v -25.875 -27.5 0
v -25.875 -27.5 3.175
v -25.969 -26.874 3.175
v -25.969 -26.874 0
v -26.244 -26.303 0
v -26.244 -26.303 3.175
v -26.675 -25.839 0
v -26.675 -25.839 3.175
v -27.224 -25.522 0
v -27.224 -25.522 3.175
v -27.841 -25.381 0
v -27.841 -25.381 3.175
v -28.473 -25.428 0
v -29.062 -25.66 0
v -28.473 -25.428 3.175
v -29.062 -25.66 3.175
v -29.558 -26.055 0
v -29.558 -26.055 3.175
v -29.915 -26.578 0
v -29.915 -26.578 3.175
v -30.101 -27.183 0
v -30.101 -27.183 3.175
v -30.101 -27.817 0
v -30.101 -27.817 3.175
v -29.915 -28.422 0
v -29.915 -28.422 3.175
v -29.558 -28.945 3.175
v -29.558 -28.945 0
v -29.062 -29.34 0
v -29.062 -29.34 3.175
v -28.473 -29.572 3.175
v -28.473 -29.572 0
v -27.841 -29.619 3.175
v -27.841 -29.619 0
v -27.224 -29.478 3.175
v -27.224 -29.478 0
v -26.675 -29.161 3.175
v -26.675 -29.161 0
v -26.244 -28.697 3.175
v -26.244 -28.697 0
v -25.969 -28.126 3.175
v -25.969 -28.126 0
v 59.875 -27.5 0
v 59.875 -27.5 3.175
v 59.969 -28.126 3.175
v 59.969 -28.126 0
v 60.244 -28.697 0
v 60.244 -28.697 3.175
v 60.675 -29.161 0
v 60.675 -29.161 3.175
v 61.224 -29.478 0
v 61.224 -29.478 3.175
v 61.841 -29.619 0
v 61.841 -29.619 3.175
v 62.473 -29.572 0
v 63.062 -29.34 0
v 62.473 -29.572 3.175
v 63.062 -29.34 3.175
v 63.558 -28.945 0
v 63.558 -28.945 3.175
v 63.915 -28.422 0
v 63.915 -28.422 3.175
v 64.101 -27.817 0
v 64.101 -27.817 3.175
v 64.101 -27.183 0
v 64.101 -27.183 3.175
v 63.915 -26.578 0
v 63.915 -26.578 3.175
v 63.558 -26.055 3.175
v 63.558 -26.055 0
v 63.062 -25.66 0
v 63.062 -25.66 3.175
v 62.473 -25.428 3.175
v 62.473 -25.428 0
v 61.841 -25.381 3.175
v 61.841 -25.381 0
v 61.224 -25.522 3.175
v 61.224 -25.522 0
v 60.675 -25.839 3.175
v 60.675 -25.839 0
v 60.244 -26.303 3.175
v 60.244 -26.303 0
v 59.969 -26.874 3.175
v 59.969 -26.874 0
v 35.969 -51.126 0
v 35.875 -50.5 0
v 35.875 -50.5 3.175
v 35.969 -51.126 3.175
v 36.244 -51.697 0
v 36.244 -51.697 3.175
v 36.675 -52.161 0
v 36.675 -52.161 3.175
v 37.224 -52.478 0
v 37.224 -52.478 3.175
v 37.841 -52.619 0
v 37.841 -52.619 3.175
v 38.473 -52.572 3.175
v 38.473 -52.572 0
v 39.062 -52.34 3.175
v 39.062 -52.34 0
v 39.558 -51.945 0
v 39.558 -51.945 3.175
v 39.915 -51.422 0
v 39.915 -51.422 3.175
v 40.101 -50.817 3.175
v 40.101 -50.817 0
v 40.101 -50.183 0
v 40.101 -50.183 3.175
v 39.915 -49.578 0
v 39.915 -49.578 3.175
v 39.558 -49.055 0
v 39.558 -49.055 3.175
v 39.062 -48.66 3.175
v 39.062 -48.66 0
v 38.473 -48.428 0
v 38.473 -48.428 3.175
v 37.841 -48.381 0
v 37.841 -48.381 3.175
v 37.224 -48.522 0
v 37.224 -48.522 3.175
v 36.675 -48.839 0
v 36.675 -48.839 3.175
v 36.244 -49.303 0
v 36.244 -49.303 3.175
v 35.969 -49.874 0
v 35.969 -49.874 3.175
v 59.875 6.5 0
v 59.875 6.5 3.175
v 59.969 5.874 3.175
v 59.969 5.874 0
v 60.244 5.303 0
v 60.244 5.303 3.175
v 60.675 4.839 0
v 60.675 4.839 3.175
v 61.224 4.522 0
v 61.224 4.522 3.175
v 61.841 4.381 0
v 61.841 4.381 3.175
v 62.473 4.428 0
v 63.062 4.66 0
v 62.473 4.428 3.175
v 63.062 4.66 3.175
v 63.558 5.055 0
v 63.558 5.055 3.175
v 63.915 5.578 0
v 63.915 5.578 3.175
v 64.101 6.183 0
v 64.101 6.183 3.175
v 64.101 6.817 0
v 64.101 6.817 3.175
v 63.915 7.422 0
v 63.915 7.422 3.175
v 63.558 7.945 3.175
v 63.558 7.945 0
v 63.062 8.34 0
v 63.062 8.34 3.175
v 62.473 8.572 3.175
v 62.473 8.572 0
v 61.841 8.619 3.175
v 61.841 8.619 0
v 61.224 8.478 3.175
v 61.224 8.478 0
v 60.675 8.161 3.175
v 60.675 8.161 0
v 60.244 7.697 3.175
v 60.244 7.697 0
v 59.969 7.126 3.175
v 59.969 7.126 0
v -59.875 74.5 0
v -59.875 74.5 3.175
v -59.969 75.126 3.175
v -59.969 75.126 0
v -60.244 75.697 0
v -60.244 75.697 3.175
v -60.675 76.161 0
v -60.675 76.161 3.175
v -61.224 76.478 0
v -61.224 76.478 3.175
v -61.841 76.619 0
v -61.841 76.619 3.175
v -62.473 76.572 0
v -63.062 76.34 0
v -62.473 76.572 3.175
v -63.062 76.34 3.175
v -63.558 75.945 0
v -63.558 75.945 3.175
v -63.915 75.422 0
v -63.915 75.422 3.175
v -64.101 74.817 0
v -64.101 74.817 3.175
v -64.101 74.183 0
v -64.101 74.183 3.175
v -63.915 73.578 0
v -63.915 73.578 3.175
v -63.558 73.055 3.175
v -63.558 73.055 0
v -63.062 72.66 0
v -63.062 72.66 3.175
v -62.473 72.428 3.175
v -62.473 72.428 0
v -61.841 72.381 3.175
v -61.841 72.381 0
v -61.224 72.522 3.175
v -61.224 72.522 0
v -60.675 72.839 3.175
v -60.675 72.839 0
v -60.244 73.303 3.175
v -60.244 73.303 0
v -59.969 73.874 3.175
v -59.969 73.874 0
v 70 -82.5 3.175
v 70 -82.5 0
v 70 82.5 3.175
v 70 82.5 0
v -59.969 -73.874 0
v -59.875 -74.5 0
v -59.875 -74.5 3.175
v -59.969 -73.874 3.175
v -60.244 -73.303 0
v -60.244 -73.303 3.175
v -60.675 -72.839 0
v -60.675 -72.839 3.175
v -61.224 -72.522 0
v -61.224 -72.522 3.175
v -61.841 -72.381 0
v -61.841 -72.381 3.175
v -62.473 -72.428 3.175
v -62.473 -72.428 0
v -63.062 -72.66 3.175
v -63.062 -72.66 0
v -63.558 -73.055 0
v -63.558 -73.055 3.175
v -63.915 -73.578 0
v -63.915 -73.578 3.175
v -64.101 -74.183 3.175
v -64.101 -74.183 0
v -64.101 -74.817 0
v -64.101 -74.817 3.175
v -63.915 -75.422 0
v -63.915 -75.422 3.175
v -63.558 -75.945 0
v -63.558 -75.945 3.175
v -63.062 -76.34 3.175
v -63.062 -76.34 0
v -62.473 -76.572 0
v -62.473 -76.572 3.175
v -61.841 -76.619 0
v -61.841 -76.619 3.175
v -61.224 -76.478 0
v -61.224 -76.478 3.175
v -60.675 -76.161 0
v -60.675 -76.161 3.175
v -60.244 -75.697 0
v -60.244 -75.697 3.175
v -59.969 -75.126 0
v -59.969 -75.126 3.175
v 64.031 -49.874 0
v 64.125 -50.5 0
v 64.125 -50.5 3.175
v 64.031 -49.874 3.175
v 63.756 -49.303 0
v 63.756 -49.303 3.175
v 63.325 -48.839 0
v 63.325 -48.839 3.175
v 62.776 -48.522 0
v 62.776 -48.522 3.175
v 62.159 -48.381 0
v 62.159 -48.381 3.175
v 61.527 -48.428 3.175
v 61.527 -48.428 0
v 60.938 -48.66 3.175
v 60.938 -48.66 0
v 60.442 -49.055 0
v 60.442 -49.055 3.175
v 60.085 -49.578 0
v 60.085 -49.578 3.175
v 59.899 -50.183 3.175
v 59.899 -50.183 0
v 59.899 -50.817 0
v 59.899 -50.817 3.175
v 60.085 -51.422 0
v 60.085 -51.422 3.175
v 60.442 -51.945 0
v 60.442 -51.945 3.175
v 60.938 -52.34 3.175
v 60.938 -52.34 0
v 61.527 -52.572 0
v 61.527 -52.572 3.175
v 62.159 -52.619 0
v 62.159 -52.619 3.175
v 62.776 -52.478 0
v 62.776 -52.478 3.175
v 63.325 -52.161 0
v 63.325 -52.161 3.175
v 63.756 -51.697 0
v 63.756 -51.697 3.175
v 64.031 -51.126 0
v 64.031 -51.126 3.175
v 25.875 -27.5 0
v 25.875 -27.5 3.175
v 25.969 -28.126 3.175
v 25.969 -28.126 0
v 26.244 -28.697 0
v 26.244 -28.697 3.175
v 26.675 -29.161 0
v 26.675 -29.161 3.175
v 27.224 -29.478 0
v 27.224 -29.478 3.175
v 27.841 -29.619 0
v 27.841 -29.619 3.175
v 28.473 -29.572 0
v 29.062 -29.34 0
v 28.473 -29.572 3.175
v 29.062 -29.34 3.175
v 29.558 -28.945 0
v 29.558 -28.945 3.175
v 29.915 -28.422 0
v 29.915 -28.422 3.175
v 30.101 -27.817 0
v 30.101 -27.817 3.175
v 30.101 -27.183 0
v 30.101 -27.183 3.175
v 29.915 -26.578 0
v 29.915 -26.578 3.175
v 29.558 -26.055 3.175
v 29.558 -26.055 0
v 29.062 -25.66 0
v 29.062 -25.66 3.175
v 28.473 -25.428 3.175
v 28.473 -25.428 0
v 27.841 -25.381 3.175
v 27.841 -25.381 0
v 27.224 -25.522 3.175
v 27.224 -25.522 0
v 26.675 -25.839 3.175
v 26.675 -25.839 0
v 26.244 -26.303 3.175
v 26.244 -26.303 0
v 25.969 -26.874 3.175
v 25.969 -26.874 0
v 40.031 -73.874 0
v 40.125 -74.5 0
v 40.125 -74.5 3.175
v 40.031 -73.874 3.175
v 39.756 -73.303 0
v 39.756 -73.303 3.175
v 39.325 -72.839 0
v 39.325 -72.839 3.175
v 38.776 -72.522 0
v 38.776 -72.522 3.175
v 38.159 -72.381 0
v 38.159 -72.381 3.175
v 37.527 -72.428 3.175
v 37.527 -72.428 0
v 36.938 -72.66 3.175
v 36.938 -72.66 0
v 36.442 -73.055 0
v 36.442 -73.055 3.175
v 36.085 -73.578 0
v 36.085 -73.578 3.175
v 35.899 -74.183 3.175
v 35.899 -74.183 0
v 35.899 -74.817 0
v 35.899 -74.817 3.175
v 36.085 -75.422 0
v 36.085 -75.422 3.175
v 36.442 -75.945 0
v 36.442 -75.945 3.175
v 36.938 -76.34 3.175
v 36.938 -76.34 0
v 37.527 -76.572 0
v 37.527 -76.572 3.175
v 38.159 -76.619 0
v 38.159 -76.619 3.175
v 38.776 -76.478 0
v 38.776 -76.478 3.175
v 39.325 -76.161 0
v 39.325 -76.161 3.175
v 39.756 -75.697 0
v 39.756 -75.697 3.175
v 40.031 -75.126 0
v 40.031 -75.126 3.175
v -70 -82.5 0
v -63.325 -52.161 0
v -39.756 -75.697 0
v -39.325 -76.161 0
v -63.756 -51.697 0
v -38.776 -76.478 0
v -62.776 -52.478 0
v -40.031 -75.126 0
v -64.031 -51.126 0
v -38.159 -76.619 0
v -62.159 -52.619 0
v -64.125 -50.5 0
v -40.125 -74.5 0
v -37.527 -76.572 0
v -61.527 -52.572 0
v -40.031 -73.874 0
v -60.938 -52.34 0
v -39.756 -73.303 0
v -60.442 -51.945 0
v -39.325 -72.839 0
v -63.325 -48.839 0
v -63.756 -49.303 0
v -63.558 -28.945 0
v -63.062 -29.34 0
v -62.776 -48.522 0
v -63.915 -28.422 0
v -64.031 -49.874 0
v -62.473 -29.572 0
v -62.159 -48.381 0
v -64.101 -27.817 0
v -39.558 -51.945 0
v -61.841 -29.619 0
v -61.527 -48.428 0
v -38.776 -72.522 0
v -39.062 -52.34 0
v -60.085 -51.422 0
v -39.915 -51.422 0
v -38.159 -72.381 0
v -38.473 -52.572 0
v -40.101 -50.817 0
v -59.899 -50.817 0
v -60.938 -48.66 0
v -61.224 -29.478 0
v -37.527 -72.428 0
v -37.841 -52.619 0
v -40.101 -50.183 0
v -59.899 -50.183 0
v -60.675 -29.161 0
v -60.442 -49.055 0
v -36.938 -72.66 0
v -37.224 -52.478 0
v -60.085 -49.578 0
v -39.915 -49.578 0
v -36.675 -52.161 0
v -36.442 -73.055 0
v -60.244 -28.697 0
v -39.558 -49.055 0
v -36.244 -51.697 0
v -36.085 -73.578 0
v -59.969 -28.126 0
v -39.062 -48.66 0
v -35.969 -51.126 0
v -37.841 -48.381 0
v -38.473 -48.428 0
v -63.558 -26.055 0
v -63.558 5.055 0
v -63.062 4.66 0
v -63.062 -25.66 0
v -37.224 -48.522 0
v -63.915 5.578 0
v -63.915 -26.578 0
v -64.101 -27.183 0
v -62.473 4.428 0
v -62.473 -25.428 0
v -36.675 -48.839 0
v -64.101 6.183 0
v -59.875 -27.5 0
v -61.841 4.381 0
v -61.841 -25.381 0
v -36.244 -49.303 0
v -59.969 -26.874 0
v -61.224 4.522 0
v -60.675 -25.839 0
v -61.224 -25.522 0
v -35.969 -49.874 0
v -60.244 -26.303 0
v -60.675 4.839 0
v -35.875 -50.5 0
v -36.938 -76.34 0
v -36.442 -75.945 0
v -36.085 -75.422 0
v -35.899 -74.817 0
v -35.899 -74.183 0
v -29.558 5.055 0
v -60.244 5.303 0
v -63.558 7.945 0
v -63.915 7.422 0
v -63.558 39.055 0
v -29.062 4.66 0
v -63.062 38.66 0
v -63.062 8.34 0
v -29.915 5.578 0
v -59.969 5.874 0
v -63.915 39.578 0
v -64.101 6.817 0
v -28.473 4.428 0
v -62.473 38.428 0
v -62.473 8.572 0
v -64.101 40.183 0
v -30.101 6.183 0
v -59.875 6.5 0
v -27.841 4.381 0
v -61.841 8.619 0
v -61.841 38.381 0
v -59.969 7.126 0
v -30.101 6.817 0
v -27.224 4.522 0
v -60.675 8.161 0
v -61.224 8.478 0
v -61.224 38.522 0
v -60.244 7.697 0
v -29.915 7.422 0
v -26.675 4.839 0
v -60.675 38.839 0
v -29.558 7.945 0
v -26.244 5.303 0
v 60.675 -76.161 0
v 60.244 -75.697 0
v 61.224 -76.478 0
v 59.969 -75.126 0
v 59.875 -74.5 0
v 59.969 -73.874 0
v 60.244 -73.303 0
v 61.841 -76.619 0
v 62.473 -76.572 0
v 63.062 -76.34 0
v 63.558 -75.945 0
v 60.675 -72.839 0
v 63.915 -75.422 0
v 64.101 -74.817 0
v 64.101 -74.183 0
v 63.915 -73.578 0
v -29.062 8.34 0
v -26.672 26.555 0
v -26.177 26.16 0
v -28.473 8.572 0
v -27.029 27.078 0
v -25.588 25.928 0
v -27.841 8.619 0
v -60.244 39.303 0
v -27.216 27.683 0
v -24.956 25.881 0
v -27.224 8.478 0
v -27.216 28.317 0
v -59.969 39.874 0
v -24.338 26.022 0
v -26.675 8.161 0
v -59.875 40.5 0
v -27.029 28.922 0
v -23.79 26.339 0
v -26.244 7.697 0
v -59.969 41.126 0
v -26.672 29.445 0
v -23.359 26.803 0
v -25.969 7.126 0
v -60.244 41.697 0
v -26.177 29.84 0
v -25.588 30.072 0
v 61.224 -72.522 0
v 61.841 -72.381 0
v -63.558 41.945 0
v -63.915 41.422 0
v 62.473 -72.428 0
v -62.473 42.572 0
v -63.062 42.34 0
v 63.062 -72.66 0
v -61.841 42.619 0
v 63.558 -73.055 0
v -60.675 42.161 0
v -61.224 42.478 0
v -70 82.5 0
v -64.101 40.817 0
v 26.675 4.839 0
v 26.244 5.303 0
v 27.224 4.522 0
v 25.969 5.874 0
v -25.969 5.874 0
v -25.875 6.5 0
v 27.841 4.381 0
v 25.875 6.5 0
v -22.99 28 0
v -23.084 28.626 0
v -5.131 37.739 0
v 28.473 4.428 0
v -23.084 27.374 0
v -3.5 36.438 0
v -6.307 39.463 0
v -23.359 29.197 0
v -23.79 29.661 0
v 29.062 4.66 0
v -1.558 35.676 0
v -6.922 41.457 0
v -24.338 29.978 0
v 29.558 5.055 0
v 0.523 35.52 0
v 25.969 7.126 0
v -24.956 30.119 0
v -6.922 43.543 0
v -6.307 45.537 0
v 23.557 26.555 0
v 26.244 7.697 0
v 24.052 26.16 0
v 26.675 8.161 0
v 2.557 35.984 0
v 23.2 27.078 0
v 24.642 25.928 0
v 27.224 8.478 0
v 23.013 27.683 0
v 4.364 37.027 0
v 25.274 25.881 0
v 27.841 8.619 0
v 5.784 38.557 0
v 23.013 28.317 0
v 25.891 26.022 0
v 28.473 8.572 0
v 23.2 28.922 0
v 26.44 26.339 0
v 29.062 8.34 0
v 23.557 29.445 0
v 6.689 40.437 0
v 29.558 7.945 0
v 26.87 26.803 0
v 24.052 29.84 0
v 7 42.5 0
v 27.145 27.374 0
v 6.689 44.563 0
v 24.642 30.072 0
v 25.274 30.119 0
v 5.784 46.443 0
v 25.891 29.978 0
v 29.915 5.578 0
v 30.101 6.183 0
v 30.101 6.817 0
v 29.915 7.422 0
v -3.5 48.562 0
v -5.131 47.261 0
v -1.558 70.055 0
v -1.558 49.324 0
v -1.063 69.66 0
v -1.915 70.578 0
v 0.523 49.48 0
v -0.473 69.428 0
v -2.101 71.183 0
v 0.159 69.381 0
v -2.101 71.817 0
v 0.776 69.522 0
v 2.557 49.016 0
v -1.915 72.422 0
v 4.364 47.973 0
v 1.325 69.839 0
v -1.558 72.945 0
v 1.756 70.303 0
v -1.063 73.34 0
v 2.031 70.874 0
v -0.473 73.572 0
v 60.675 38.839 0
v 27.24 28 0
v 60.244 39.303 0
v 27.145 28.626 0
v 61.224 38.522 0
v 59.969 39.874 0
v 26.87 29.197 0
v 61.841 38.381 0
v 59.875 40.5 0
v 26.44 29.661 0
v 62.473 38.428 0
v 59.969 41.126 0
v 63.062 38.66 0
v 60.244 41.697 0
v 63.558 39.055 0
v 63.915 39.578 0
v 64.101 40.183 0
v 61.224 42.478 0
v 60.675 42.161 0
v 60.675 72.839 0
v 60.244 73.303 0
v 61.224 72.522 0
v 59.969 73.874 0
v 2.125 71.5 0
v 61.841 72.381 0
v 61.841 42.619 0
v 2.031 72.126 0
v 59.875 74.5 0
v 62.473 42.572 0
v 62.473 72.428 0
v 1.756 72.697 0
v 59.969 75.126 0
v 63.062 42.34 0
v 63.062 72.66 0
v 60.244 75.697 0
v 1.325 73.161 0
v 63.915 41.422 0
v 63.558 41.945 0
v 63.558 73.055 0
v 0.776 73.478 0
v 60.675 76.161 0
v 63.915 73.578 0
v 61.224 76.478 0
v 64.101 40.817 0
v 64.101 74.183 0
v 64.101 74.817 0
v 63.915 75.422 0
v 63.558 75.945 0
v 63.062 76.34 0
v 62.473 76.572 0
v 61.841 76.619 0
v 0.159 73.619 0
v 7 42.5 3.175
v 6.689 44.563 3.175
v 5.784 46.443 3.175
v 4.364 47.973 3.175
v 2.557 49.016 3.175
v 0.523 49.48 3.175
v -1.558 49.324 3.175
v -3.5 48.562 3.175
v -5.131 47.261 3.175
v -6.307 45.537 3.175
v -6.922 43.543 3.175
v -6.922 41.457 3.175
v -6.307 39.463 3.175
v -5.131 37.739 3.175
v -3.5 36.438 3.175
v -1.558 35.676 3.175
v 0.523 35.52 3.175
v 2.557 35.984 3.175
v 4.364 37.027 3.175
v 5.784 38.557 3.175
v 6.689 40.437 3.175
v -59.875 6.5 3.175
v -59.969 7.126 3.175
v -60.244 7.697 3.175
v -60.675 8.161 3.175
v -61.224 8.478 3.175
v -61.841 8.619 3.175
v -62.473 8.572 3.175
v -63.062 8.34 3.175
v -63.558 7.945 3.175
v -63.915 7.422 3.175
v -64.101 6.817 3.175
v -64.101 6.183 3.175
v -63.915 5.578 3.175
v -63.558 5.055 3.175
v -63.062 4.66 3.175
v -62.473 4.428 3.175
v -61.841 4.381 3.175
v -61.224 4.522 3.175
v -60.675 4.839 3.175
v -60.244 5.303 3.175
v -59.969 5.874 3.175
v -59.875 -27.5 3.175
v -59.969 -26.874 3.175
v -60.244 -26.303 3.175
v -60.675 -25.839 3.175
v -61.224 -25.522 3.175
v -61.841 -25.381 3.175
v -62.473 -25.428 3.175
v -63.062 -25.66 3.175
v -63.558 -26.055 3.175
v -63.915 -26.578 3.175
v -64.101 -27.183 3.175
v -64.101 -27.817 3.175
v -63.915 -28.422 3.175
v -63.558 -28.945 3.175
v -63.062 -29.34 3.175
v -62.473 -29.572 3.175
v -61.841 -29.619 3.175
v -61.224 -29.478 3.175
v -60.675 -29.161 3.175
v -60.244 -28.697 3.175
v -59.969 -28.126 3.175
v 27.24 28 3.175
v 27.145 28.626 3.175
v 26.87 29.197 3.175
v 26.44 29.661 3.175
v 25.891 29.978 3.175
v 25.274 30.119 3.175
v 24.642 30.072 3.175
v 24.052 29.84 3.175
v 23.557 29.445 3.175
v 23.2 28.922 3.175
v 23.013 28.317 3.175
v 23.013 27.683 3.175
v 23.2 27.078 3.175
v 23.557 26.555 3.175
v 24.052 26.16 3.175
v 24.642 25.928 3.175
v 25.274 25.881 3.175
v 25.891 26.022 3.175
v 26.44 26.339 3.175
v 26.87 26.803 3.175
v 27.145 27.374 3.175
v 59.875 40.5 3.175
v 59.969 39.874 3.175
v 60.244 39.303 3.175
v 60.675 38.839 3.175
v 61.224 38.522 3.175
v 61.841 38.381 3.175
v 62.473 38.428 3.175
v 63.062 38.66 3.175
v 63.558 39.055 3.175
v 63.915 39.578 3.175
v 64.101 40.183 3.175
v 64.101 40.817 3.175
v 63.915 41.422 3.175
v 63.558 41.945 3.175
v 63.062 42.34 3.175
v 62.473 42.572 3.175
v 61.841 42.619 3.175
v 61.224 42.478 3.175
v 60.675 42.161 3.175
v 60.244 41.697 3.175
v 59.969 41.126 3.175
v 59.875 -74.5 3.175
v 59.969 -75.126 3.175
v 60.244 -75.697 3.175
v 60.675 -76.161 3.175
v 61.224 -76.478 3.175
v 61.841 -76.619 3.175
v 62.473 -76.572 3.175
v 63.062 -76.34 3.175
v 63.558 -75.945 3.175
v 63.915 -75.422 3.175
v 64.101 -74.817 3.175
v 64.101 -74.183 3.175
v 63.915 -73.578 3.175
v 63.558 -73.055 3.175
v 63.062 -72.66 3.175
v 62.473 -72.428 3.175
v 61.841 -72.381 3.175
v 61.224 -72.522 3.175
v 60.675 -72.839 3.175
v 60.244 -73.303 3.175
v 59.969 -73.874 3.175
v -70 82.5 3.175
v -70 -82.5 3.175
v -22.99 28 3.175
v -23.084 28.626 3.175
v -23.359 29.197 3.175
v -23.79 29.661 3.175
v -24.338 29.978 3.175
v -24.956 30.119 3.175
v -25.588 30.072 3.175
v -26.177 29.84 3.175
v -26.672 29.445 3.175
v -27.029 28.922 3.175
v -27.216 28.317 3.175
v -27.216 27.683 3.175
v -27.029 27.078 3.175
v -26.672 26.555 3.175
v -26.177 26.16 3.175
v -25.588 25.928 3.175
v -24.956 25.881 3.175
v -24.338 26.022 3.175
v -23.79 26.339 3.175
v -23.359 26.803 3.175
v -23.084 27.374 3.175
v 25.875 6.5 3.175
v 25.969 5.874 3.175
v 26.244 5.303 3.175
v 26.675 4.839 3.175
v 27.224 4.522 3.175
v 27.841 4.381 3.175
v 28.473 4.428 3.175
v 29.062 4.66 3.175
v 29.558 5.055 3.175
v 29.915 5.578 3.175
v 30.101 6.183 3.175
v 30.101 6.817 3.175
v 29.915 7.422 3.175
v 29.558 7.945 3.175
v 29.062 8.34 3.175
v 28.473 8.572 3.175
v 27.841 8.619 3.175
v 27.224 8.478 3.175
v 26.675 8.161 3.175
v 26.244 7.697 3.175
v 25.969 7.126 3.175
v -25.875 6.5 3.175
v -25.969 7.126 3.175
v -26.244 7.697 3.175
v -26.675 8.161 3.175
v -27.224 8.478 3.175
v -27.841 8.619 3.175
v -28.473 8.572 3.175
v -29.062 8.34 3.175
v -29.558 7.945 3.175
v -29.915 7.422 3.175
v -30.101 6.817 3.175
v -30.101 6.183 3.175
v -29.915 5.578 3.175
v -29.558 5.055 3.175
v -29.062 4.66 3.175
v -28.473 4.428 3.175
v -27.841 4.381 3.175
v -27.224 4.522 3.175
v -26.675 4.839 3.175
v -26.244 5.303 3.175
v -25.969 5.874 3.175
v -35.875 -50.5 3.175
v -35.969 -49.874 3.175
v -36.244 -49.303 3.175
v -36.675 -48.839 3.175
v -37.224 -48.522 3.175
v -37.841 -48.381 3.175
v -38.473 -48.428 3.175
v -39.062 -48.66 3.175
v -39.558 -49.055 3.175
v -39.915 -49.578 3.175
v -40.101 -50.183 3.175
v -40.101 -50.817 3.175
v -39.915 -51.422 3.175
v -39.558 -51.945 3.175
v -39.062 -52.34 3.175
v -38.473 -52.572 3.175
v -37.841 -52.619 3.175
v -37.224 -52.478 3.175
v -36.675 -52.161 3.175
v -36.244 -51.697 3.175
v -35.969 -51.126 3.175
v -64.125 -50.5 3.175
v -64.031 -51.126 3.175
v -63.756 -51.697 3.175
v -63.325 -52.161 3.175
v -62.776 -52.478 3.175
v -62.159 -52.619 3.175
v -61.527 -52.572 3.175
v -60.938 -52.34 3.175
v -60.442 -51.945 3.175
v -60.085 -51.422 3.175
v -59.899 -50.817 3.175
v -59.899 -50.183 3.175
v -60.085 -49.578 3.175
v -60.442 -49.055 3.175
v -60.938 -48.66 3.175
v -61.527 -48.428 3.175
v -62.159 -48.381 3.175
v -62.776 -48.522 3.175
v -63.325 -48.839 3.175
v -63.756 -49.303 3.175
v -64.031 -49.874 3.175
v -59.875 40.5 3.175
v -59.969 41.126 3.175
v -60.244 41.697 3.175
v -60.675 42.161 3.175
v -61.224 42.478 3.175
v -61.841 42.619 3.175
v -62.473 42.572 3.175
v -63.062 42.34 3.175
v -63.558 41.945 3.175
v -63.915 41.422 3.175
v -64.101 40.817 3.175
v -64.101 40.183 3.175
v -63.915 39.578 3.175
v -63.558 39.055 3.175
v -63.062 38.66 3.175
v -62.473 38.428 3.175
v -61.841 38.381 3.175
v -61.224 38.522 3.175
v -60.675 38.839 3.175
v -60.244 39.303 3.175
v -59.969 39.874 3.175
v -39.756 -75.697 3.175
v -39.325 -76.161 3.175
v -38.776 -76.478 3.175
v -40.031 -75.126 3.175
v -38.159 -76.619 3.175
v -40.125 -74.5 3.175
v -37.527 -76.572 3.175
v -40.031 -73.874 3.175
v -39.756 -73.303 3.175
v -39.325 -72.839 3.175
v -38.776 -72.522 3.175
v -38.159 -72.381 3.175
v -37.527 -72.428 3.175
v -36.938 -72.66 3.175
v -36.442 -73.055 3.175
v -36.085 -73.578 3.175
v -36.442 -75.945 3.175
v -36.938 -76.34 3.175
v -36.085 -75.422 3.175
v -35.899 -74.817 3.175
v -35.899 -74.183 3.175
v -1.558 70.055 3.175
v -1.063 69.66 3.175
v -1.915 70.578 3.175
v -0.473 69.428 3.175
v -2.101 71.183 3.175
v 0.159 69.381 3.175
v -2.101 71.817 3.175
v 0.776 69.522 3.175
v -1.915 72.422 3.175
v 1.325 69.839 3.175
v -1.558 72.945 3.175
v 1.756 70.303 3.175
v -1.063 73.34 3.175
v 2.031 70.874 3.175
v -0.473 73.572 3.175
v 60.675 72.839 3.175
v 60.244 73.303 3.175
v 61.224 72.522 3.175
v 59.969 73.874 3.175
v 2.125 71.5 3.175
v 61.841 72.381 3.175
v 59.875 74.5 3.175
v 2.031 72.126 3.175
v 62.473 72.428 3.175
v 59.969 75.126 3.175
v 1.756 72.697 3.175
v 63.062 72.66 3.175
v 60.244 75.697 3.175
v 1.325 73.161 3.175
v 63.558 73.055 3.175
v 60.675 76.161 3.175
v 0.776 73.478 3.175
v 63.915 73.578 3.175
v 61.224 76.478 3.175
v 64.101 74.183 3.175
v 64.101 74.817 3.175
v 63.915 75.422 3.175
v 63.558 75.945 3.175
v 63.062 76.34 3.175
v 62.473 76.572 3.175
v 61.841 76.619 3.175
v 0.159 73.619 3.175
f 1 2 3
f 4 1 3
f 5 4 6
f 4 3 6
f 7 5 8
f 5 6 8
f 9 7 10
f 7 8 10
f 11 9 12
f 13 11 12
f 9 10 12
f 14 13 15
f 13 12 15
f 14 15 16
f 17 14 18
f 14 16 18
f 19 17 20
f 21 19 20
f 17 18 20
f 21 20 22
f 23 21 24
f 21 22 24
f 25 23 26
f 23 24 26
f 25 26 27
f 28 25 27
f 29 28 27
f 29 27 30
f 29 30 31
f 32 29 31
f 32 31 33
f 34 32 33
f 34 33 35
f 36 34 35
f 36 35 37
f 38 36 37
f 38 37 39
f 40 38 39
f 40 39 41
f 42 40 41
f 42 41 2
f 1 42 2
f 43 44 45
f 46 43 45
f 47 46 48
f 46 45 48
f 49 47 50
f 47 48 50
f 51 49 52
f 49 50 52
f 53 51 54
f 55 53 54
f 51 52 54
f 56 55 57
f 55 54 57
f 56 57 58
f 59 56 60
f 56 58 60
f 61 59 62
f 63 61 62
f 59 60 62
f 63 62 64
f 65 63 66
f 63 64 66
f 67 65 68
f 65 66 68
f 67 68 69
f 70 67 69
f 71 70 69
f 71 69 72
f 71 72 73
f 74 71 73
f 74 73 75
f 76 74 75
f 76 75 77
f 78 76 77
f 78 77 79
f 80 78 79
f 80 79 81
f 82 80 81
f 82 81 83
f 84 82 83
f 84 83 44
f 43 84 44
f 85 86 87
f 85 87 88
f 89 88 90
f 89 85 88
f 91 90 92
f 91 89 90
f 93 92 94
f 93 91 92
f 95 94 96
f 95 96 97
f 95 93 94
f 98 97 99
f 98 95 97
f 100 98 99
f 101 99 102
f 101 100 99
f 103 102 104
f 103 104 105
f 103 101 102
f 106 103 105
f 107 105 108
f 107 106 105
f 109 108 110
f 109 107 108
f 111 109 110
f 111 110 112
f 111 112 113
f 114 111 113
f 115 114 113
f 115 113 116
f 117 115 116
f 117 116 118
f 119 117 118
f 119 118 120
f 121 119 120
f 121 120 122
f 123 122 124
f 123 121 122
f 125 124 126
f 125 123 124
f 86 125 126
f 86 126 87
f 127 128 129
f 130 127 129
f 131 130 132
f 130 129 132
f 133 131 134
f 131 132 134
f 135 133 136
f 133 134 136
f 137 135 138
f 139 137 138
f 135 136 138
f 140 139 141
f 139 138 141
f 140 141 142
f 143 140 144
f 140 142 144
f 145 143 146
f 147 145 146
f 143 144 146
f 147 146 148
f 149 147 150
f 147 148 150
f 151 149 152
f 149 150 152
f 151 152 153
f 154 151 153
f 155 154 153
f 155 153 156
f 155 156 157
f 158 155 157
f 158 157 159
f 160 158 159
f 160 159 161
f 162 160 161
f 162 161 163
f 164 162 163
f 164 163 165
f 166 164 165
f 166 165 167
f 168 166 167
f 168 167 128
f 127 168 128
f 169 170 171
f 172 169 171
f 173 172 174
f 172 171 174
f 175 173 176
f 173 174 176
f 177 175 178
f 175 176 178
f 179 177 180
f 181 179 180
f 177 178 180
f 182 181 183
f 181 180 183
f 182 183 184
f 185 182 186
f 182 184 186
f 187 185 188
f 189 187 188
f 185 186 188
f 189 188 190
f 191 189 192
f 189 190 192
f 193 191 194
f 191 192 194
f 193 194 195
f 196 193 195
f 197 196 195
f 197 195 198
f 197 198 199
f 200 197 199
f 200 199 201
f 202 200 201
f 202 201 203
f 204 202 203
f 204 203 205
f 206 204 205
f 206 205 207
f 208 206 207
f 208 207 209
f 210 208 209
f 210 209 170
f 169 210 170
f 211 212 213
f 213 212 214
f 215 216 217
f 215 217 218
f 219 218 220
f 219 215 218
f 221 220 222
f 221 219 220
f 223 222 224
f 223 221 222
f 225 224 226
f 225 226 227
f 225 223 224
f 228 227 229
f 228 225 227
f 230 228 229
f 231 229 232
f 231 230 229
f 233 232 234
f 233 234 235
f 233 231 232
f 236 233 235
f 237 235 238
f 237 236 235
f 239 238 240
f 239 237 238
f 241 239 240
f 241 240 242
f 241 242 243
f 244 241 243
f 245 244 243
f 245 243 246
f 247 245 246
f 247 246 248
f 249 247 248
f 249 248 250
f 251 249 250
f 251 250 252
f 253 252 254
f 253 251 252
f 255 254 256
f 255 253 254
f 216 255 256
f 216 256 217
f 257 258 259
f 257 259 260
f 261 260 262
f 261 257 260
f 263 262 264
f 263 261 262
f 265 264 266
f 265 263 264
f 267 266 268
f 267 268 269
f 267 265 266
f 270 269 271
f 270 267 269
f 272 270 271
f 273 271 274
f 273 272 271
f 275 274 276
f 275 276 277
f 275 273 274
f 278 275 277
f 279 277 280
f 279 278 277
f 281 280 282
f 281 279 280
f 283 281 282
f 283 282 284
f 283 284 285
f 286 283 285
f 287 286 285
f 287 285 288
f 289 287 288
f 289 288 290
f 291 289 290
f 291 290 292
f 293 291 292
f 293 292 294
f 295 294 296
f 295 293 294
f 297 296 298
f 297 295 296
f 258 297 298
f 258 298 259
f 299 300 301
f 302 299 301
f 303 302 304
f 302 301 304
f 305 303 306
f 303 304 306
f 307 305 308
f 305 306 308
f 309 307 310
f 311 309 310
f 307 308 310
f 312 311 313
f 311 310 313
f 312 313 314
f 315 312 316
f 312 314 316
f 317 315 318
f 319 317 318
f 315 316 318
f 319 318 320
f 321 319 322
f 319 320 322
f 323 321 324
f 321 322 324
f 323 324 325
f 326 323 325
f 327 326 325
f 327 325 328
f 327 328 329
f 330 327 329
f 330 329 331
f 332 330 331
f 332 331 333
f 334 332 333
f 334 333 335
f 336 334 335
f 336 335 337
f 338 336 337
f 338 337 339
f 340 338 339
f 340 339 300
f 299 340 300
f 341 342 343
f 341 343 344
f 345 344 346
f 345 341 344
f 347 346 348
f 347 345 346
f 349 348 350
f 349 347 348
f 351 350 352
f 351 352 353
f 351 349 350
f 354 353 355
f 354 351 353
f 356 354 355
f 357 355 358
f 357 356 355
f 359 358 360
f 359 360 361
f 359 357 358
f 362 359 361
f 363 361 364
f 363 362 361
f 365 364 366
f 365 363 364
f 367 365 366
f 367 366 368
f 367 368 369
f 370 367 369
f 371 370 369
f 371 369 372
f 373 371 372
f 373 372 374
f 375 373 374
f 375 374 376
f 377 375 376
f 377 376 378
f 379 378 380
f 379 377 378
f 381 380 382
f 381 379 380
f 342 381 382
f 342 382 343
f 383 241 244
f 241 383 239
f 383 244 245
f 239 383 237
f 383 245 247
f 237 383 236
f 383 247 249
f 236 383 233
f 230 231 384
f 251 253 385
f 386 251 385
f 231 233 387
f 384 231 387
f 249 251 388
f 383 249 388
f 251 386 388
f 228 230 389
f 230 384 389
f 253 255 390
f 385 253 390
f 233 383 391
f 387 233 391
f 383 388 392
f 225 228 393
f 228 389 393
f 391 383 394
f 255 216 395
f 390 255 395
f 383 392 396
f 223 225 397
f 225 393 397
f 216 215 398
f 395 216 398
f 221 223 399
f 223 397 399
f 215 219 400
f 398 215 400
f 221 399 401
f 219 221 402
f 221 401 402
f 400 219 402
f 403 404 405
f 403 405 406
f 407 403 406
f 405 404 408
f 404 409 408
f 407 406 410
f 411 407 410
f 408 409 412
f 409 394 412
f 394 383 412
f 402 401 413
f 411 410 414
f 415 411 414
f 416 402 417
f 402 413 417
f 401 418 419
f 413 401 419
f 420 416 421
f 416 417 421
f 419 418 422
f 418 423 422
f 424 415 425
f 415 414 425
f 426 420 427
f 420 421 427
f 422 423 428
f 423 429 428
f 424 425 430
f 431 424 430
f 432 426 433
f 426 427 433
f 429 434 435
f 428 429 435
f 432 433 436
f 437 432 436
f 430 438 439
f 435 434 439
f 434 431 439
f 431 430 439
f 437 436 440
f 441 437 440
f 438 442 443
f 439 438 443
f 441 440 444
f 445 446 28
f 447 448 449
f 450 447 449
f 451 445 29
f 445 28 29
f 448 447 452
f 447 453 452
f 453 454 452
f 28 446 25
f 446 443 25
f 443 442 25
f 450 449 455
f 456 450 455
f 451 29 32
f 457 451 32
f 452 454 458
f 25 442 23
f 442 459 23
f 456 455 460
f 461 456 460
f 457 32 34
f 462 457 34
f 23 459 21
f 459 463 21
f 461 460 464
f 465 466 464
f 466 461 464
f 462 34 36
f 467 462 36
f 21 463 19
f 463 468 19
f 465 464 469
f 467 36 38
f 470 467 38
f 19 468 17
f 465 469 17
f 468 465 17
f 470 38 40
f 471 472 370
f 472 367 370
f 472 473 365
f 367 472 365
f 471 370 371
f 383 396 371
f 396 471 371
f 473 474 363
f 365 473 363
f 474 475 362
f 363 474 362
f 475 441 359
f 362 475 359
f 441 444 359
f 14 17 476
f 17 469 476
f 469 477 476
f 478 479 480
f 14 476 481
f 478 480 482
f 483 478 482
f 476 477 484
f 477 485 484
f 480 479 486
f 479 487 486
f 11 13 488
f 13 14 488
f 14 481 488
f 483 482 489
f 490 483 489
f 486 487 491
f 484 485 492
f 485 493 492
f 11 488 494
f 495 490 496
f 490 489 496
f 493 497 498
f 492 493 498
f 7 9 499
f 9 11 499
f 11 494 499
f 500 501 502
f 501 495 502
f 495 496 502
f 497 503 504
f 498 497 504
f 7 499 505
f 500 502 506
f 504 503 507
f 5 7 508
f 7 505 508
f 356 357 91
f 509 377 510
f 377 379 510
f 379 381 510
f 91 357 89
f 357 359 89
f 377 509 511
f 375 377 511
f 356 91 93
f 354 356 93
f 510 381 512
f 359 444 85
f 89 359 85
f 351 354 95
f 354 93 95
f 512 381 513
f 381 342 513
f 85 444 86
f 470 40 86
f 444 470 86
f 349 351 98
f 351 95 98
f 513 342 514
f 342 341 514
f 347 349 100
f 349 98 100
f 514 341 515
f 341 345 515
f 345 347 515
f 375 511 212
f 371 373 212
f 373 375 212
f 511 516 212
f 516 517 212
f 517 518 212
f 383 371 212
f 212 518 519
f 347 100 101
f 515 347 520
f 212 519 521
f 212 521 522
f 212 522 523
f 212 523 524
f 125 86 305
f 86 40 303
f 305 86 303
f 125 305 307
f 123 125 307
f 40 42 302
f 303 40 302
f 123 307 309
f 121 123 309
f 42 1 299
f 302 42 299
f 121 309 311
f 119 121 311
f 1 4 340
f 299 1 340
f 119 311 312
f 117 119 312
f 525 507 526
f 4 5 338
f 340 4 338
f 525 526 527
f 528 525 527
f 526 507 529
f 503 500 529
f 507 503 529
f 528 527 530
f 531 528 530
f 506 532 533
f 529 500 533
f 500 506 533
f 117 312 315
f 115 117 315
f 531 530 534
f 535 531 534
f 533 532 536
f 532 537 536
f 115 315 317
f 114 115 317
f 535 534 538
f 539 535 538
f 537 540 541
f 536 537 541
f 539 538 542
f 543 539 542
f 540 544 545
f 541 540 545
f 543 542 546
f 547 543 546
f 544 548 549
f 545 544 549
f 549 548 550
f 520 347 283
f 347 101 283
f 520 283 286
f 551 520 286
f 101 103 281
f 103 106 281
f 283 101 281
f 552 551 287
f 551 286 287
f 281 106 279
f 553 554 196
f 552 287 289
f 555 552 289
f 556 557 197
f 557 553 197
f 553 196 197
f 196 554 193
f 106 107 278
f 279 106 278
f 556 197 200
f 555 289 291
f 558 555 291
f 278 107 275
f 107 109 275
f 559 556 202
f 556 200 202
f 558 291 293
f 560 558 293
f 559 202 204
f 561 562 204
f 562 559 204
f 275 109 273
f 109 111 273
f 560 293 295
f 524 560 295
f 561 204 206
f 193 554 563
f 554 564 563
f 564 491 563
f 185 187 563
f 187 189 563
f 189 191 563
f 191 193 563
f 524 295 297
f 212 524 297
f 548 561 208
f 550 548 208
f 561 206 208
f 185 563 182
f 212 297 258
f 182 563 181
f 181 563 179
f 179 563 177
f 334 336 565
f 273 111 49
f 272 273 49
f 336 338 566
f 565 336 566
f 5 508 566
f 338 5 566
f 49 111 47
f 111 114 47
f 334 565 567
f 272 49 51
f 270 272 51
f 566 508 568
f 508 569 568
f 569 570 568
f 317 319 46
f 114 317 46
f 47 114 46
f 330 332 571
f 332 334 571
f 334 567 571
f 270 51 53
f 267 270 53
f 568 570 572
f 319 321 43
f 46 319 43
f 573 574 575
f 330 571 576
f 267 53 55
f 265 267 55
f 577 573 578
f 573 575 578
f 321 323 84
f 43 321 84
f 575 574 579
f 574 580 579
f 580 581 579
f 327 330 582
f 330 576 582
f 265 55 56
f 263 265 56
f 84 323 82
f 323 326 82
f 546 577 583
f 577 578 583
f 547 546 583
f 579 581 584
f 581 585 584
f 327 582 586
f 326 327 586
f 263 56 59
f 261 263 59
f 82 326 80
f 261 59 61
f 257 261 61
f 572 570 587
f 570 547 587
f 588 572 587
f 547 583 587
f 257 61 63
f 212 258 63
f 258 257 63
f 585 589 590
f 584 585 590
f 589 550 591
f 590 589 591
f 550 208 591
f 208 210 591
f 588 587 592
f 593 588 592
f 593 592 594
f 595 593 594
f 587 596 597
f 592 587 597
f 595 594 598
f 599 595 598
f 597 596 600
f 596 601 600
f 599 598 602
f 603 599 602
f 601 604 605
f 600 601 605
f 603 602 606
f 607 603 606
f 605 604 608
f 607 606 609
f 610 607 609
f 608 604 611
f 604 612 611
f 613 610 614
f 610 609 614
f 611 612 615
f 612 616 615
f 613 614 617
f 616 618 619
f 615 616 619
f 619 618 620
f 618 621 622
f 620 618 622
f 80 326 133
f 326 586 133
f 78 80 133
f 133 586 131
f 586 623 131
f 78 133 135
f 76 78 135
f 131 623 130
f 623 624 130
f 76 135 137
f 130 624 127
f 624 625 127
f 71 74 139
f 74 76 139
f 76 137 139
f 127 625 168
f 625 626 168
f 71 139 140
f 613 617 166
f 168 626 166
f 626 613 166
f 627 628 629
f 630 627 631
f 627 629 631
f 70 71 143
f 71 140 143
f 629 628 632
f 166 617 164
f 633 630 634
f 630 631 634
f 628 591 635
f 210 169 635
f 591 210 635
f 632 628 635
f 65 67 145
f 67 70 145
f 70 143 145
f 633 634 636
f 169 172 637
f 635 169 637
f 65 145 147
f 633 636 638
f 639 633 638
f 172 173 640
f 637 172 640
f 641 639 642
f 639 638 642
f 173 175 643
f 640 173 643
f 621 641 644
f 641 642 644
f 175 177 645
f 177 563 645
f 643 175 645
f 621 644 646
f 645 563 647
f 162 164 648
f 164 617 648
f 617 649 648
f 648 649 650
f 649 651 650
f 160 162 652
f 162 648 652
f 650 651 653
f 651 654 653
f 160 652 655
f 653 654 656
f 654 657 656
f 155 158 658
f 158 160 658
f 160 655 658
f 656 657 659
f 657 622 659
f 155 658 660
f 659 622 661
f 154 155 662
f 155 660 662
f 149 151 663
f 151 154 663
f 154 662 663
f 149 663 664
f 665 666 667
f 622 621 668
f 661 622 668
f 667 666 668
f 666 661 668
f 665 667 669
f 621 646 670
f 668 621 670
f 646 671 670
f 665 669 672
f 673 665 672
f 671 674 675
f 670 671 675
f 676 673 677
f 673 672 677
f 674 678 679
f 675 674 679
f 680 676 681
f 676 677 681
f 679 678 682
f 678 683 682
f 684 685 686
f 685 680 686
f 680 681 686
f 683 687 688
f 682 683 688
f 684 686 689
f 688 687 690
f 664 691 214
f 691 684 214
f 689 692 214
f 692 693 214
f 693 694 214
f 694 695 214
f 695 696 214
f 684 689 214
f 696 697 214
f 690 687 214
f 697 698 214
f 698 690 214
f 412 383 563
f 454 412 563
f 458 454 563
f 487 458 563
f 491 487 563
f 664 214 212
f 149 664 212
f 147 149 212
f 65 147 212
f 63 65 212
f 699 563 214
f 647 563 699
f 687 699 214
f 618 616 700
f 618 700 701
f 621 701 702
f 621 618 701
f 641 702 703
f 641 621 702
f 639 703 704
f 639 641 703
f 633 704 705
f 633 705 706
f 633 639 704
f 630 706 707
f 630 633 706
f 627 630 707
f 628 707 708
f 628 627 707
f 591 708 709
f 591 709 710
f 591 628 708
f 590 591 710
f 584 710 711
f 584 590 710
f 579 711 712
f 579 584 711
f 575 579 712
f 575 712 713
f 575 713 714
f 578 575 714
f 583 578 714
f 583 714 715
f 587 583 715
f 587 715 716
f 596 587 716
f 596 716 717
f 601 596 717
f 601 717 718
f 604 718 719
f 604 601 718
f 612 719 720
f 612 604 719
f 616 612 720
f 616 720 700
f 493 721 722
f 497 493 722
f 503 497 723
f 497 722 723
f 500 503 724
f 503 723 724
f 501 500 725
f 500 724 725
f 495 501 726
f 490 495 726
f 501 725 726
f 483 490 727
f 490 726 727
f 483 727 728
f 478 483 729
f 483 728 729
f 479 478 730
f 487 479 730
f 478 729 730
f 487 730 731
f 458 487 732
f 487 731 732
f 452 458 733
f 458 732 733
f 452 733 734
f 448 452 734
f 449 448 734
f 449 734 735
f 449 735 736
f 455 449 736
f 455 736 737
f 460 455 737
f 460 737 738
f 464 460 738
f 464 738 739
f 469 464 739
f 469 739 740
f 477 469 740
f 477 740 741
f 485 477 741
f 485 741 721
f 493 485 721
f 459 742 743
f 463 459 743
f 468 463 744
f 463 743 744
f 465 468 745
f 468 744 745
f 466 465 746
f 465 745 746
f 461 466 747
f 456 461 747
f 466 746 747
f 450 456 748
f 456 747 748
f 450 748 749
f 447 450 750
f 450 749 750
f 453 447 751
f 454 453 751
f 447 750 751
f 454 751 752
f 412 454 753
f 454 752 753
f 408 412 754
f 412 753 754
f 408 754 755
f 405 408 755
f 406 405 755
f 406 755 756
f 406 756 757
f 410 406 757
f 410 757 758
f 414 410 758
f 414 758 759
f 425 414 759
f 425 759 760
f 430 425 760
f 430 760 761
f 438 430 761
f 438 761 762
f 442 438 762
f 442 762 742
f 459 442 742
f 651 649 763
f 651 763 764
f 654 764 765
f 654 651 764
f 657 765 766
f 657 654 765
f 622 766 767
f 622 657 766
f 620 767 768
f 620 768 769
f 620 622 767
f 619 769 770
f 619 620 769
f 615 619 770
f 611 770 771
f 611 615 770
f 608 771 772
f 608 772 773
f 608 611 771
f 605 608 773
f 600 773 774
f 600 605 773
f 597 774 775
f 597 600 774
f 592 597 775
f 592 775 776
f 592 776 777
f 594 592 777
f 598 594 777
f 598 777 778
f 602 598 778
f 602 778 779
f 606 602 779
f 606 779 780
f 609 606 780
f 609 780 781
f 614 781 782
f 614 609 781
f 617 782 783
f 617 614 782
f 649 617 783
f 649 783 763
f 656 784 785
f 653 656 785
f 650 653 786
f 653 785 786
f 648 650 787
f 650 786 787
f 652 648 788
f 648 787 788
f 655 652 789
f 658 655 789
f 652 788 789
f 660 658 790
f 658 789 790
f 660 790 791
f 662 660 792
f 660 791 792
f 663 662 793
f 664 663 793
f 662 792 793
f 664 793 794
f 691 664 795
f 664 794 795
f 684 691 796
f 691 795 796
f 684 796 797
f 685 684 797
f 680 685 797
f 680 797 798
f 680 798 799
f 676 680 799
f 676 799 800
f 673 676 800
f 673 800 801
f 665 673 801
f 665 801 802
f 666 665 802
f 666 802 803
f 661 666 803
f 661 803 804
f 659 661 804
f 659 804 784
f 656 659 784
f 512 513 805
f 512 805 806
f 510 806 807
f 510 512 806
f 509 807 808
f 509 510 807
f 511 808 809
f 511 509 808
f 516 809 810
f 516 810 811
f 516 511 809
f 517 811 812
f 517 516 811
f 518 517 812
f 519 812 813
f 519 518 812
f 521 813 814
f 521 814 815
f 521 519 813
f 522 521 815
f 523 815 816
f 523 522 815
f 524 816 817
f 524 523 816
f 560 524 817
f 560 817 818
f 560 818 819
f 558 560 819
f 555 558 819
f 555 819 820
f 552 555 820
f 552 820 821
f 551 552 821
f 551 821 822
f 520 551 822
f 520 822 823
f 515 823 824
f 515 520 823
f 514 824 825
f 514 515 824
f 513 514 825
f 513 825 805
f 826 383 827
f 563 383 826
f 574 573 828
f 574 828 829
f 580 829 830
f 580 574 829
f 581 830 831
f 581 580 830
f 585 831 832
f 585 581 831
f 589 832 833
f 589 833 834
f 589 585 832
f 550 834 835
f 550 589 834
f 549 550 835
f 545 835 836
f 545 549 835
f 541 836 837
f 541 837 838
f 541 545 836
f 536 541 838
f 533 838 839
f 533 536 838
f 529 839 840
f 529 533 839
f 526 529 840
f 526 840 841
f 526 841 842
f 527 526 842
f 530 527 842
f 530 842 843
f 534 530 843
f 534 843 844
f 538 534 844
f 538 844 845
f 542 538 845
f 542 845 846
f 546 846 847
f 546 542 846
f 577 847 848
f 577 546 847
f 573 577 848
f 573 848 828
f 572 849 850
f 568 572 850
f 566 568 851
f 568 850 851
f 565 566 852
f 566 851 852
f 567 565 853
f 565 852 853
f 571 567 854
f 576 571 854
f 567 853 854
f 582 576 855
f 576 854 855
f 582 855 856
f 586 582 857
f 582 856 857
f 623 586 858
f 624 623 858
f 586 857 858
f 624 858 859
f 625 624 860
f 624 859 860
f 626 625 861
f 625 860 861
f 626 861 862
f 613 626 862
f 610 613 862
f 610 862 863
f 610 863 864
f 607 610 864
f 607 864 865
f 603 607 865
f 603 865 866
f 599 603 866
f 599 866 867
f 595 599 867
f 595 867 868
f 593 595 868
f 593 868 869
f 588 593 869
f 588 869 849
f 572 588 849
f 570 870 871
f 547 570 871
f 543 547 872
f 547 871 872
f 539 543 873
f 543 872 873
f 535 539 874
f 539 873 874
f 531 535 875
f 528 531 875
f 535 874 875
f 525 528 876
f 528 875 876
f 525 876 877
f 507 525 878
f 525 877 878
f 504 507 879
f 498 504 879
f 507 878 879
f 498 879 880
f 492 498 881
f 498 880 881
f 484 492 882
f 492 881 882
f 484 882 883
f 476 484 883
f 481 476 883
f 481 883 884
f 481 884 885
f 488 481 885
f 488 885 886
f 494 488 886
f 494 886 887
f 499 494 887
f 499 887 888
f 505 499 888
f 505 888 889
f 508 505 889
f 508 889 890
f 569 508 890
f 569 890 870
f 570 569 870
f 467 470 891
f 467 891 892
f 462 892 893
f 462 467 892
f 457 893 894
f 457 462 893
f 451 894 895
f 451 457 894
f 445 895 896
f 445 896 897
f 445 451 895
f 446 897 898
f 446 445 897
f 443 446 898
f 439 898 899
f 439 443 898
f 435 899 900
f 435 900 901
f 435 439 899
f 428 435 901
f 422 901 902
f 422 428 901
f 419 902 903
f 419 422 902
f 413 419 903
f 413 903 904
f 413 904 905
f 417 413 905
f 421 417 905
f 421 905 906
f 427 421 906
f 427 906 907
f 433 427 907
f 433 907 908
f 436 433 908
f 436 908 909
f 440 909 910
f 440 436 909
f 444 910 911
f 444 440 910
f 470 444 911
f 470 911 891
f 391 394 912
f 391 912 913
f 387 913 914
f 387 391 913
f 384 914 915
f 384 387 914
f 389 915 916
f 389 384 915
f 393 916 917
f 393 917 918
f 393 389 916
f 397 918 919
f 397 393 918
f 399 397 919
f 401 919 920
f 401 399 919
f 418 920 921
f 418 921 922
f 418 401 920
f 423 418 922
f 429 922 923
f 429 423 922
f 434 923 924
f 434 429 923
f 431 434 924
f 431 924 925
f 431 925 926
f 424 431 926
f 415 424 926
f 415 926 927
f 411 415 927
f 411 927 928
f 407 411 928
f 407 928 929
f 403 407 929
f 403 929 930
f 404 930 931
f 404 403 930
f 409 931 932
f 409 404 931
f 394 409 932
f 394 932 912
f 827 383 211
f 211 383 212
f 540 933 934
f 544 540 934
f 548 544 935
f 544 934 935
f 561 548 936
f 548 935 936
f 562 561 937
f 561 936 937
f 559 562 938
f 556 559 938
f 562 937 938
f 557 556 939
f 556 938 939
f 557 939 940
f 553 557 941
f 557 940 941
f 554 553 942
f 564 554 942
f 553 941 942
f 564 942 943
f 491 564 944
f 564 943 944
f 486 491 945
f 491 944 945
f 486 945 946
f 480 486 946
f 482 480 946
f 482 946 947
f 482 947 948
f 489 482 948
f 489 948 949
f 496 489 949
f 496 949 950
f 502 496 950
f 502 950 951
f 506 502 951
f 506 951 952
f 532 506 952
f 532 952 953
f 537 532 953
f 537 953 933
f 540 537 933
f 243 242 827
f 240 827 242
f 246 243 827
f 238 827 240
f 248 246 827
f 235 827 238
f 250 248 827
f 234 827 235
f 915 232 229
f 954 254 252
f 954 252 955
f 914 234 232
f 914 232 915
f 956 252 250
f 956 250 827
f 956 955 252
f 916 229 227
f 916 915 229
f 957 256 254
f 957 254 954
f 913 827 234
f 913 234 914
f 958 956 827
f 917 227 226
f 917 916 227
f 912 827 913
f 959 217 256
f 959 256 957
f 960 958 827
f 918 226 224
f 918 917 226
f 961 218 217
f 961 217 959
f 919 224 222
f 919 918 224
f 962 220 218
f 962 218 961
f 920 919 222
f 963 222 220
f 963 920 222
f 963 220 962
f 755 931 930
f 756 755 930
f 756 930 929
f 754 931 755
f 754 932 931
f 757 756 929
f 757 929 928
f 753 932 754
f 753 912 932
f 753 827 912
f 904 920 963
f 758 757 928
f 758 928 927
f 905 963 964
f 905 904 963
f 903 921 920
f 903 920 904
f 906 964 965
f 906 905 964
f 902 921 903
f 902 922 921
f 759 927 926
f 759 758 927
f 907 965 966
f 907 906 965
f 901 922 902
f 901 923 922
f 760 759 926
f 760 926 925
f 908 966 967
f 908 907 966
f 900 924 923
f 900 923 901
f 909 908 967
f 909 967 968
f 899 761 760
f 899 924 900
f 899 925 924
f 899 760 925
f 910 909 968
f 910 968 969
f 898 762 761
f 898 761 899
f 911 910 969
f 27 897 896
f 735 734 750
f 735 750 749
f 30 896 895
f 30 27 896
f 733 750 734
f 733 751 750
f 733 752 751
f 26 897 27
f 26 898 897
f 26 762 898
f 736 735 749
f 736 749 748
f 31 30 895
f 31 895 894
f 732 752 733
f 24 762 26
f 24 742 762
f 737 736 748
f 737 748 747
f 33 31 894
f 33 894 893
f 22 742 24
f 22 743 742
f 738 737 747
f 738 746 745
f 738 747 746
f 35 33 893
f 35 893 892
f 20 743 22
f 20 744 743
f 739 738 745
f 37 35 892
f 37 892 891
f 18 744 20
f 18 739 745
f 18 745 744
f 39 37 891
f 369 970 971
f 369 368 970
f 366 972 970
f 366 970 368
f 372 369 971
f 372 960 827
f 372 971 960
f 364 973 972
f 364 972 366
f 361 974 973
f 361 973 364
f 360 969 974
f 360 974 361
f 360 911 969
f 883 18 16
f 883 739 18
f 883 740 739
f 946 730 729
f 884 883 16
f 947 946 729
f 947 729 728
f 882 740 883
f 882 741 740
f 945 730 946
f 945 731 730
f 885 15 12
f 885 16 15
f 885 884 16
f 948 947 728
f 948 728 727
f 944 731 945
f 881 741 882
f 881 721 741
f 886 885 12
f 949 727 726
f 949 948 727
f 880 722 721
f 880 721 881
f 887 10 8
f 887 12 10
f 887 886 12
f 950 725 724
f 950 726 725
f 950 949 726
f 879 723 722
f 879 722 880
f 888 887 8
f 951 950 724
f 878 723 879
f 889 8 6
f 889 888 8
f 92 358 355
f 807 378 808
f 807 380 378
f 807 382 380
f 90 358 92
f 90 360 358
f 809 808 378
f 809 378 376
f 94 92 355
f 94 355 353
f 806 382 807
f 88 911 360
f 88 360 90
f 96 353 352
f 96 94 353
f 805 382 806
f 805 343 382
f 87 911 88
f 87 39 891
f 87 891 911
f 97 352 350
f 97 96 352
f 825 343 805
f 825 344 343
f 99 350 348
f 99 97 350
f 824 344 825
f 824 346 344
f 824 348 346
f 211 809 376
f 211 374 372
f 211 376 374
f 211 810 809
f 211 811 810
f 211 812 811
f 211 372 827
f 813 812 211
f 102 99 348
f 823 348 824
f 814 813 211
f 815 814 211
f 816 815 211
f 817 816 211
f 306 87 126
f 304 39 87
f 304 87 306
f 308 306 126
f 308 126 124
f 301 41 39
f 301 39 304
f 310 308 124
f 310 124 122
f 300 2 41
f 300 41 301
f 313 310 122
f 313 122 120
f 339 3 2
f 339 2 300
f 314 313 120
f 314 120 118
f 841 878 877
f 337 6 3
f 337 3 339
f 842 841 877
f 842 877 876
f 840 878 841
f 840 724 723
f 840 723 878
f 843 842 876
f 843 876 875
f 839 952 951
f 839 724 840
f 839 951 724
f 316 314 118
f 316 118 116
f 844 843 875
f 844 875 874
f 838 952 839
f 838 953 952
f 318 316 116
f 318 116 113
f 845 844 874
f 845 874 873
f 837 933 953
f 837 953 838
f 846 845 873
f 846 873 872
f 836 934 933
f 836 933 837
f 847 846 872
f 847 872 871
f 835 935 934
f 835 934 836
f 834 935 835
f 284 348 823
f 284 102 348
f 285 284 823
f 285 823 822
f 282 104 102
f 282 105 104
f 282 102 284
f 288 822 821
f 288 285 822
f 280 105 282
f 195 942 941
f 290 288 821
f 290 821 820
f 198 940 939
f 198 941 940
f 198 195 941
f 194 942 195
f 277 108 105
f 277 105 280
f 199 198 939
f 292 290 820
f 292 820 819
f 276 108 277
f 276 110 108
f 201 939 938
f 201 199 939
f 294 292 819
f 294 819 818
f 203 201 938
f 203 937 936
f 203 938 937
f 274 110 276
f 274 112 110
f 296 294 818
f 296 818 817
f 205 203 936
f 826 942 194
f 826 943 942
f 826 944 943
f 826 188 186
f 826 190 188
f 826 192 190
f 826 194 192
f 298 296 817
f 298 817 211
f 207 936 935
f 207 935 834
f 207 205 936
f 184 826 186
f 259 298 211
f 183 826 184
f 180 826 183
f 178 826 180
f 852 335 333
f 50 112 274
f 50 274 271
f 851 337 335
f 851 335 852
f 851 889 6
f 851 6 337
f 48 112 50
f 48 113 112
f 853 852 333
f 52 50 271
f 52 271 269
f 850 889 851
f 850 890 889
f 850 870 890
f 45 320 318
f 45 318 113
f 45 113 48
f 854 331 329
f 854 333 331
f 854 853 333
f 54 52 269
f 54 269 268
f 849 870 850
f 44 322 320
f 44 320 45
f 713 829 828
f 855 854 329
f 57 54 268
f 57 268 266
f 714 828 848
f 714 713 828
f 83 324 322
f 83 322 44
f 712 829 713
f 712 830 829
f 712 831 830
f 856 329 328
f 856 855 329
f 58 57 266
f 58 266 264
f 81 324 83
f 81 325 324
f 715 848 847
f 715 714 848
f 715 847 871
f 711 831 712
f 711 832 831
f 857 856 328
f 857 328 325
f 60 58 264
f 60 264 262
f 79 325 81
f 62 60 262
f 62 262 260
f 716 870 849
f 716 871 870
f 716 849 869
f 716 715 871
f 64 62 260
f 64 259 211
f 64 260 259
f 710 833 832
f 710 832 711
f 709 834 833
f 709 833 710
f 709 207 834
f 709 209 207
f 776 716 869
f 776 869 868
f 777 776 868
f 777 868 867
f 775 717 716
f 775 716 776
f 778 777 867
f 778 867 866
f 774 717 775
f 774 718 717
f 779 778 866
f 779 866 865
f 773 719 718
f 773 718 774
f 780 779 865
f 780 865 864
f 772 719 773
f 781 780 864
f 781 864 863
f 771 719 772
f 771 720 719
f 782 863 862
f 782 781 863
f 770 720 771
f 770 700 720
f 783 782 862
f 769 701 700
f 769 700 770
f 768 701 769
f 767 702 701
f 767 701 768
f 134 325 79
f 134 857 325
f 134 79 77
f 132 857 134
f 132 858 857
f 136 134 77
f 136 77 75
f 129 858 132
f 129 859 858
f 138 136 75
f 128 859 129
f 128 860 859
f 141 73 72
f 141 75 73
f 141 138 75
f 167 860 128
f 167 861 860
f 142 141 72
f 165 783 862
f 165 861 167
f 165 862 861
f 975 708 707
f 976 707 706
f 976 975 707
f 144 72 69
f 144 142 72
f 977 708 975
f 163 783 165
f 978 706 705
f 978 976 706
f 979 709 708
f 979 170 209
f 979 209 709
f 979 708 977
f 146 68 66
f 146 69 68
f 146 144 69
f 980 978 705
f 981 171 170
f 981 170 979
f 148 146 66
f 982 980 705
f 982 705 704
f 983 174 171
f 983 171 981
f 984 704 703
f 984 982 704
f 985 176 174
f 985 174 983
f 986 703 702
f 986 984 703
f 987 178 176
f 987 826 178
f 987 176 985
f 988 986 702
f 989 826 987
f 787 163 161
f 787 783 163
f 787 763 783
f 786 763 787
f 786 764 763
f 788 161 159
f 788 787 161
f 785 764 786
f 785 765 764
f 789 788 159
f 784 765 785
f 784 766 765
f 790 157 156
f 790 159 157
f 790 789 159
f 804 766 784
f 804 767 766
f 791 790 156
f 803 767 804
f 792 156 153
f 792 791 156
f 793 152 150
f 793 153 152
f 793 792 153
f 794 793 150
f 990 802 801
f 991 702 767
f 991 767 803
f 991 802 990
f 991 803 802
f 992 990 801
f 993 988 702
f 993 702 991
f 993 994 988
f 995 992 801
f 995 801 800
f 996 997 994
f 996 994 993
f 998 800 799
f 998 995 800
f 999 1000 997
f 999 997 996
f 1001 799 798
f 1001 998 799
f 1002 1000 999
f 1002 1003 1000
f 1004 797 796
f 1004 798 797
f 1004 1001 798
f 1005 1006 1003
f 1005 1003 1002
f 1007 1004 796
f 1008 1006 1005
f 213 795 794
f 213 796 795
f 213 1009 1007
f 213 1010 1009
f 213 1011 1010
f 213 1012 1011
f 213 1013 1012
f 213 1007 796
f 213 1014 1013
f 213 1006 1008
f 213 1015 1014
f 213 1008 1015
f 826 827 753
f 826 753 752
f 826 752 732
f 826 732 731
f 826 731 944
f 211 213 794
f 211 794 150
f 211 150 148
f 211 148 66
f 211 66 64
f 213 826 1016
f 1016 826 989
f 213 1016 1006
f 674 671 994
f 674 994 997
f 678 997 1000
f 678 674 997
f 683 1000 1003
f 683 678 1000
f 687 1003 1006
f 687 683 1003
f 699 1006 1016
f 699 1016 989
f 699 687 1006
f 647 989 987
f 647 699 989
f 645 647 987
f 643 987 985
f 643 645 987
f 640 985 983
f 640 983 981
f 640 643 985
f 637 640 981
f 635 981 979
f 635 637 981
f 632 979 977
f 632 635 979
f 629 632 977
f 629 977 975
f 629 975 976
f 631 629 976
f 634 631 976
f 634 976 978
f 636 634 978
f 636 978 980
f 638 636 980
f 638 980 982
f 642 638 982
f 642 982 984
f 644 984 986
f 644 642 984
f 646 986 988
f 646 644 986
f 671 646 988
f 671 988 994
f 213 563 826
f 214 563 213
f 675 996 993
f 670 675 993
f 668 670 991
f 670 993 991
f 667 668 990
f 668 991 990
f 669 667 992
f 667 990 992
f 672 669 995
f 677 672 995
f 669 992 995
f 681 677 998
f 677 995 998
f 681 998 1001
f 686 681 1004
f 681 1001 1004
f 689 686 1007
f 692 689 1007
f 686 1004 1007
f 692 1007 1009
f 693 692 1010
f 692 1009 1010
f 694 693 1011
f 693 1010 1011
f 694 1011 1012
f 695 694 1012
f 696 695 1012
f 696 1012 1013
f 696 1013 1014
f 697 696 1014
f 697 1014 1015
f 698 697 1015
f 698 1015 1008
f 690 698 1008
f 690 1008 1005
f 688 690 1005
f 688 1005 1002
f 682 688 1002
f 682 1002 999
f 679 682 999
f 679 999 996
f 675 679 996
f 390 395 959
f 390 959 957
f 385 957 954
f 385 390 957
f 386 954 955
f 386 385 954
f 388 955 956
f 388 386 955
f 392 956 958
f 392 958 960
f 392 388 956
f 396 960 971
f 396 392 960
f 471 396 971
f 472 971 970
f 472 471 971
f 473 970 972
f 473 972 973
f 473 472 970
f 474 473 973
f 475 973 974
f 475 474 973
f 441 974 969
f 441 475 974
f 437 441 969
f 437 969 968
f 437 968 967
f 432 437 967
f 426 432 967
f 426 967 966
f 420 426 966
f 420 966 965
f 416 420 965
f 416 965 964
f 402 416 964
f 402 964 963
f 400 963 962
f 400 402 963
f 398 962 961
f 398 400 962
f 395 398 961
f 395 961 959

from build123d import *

# Parameters (mm, degrees)
SKETCH1_W           = 140
SKETCH1_H           = 165
SKETCH1_R           = 2.125
SKETCH1_R_2         = 7
BOSS_EXTRUDE1_DEPTH = 3.175
SKETCH2_R           = 2.125
CUT_EXTRUDE1_DEPTH  = 109.242000282


with BuildPart() as part:
    # Sketch1 → Boss-Extrude1 (new body)
    with BuildSketch(Plane.XY):
        Rectangle(SKETCH1_W, SKETCH1_H)
        with Locations((0, 71.5)):
            Circle(SKETCH1_R, mode=Mode.SUBTRACT)
        with Locations((25.11473671, 28)):
            Circle(SKETCH1_R, mode=Mode.SUBTRACT)
        with Locations((-25.11473671, 28)):
            Circle(SKETCH1_R, mode=Mode.SUBTRACT)
        with Locations((0, 42.5)):
            Circle(SKETCH1_R_2, mode=Mode.SUBTRACT)
        with Locations((-62, -74.5)):
            Circle(SKETCH1_R, mode=Mode.SUBTRACT)
        with Locations(Location((-38, -74.5, 0), (0, 0, 180))):
            Circle(SKETCH1_R, mode=Mode.SUBTRACT)
        with Locations((-38, -50.5)):
            Circle(SKETCH1_R, mode=Mode.SUBTRACT)
        with Locations(Location((-62, -50.5, 0), (0, 0, 180))):
            Circle(SKETCH1_R, mode=Mode.SUBTRACT)
        with Locations((38, -74.5)):
            Circle(SKETCH1_R, mode=Mode.SUBTRACT)
        with Locations(Location((62, -74.5, 0), (0, 0, 180))):
            Circle(SKETCH1_R, mode=Mode.SUBTRACT)
        with Locations((62, -50.5)):
            Circle(SKETCH1_R, mode=Mode.SUBTRACT)
        with Locations(Location((38, -50.5, 0), (0, 0, 180))):
            Circle(SKETCH1_R, mode=Mode.SUBTRACT)
    extrude(amount=BOSS_EXTRUDE1_DEPTH)

    # Sketch2 → Cut-Extrude1 (cut, through all)
    with BuildSketch(Plane.XY.offset(3.175)):
        with Locations((-62, 74.5)):
            Circle(SKETCH2_R)
        with Locations((-62, 40.5)):
            Circle(SKETCH2_R)
        with Locations((-62, 6.5)):
            Circle(SKETCH2_R)
        with Locations((-62, -27.5)):
            Circle(SKETCH2_R)
        with Locations((-28, 6.5)):
            Circle(SKETCH2_R)
        with Locations((-28, -27.5)):
            Circle(SKETCH2_R)
        with Locations(Location((28, -27.5, 0), (0, 0, 180))):
            Circle(SKETCH2_R)
        with Locations(Location((28, 6.5, 0), (0, 0, 180))):
            Circle(SKETCH2_R)
        with Locations(Location((62, -27.5, 0), (0, 0, 180))):
            Circle(SKETCH2_R)
        with Locations(Location((62, 6.5, 0), (0, 0, 180))):
            Circle(SKETCH2_R)
        with Locations(Location((62, 40.5, 0), (0, 0, 180))):
            Circle(SKETCH2_R)
        with Locations(Location((62, 74.5, 0), (0, 0, 180))):
            Circle(SKETCH2_R)
    extrude(amount=-CUT_EXTRUDE1_DEPTH, mode=Mode.SUBTRACT)


solid = part.part
